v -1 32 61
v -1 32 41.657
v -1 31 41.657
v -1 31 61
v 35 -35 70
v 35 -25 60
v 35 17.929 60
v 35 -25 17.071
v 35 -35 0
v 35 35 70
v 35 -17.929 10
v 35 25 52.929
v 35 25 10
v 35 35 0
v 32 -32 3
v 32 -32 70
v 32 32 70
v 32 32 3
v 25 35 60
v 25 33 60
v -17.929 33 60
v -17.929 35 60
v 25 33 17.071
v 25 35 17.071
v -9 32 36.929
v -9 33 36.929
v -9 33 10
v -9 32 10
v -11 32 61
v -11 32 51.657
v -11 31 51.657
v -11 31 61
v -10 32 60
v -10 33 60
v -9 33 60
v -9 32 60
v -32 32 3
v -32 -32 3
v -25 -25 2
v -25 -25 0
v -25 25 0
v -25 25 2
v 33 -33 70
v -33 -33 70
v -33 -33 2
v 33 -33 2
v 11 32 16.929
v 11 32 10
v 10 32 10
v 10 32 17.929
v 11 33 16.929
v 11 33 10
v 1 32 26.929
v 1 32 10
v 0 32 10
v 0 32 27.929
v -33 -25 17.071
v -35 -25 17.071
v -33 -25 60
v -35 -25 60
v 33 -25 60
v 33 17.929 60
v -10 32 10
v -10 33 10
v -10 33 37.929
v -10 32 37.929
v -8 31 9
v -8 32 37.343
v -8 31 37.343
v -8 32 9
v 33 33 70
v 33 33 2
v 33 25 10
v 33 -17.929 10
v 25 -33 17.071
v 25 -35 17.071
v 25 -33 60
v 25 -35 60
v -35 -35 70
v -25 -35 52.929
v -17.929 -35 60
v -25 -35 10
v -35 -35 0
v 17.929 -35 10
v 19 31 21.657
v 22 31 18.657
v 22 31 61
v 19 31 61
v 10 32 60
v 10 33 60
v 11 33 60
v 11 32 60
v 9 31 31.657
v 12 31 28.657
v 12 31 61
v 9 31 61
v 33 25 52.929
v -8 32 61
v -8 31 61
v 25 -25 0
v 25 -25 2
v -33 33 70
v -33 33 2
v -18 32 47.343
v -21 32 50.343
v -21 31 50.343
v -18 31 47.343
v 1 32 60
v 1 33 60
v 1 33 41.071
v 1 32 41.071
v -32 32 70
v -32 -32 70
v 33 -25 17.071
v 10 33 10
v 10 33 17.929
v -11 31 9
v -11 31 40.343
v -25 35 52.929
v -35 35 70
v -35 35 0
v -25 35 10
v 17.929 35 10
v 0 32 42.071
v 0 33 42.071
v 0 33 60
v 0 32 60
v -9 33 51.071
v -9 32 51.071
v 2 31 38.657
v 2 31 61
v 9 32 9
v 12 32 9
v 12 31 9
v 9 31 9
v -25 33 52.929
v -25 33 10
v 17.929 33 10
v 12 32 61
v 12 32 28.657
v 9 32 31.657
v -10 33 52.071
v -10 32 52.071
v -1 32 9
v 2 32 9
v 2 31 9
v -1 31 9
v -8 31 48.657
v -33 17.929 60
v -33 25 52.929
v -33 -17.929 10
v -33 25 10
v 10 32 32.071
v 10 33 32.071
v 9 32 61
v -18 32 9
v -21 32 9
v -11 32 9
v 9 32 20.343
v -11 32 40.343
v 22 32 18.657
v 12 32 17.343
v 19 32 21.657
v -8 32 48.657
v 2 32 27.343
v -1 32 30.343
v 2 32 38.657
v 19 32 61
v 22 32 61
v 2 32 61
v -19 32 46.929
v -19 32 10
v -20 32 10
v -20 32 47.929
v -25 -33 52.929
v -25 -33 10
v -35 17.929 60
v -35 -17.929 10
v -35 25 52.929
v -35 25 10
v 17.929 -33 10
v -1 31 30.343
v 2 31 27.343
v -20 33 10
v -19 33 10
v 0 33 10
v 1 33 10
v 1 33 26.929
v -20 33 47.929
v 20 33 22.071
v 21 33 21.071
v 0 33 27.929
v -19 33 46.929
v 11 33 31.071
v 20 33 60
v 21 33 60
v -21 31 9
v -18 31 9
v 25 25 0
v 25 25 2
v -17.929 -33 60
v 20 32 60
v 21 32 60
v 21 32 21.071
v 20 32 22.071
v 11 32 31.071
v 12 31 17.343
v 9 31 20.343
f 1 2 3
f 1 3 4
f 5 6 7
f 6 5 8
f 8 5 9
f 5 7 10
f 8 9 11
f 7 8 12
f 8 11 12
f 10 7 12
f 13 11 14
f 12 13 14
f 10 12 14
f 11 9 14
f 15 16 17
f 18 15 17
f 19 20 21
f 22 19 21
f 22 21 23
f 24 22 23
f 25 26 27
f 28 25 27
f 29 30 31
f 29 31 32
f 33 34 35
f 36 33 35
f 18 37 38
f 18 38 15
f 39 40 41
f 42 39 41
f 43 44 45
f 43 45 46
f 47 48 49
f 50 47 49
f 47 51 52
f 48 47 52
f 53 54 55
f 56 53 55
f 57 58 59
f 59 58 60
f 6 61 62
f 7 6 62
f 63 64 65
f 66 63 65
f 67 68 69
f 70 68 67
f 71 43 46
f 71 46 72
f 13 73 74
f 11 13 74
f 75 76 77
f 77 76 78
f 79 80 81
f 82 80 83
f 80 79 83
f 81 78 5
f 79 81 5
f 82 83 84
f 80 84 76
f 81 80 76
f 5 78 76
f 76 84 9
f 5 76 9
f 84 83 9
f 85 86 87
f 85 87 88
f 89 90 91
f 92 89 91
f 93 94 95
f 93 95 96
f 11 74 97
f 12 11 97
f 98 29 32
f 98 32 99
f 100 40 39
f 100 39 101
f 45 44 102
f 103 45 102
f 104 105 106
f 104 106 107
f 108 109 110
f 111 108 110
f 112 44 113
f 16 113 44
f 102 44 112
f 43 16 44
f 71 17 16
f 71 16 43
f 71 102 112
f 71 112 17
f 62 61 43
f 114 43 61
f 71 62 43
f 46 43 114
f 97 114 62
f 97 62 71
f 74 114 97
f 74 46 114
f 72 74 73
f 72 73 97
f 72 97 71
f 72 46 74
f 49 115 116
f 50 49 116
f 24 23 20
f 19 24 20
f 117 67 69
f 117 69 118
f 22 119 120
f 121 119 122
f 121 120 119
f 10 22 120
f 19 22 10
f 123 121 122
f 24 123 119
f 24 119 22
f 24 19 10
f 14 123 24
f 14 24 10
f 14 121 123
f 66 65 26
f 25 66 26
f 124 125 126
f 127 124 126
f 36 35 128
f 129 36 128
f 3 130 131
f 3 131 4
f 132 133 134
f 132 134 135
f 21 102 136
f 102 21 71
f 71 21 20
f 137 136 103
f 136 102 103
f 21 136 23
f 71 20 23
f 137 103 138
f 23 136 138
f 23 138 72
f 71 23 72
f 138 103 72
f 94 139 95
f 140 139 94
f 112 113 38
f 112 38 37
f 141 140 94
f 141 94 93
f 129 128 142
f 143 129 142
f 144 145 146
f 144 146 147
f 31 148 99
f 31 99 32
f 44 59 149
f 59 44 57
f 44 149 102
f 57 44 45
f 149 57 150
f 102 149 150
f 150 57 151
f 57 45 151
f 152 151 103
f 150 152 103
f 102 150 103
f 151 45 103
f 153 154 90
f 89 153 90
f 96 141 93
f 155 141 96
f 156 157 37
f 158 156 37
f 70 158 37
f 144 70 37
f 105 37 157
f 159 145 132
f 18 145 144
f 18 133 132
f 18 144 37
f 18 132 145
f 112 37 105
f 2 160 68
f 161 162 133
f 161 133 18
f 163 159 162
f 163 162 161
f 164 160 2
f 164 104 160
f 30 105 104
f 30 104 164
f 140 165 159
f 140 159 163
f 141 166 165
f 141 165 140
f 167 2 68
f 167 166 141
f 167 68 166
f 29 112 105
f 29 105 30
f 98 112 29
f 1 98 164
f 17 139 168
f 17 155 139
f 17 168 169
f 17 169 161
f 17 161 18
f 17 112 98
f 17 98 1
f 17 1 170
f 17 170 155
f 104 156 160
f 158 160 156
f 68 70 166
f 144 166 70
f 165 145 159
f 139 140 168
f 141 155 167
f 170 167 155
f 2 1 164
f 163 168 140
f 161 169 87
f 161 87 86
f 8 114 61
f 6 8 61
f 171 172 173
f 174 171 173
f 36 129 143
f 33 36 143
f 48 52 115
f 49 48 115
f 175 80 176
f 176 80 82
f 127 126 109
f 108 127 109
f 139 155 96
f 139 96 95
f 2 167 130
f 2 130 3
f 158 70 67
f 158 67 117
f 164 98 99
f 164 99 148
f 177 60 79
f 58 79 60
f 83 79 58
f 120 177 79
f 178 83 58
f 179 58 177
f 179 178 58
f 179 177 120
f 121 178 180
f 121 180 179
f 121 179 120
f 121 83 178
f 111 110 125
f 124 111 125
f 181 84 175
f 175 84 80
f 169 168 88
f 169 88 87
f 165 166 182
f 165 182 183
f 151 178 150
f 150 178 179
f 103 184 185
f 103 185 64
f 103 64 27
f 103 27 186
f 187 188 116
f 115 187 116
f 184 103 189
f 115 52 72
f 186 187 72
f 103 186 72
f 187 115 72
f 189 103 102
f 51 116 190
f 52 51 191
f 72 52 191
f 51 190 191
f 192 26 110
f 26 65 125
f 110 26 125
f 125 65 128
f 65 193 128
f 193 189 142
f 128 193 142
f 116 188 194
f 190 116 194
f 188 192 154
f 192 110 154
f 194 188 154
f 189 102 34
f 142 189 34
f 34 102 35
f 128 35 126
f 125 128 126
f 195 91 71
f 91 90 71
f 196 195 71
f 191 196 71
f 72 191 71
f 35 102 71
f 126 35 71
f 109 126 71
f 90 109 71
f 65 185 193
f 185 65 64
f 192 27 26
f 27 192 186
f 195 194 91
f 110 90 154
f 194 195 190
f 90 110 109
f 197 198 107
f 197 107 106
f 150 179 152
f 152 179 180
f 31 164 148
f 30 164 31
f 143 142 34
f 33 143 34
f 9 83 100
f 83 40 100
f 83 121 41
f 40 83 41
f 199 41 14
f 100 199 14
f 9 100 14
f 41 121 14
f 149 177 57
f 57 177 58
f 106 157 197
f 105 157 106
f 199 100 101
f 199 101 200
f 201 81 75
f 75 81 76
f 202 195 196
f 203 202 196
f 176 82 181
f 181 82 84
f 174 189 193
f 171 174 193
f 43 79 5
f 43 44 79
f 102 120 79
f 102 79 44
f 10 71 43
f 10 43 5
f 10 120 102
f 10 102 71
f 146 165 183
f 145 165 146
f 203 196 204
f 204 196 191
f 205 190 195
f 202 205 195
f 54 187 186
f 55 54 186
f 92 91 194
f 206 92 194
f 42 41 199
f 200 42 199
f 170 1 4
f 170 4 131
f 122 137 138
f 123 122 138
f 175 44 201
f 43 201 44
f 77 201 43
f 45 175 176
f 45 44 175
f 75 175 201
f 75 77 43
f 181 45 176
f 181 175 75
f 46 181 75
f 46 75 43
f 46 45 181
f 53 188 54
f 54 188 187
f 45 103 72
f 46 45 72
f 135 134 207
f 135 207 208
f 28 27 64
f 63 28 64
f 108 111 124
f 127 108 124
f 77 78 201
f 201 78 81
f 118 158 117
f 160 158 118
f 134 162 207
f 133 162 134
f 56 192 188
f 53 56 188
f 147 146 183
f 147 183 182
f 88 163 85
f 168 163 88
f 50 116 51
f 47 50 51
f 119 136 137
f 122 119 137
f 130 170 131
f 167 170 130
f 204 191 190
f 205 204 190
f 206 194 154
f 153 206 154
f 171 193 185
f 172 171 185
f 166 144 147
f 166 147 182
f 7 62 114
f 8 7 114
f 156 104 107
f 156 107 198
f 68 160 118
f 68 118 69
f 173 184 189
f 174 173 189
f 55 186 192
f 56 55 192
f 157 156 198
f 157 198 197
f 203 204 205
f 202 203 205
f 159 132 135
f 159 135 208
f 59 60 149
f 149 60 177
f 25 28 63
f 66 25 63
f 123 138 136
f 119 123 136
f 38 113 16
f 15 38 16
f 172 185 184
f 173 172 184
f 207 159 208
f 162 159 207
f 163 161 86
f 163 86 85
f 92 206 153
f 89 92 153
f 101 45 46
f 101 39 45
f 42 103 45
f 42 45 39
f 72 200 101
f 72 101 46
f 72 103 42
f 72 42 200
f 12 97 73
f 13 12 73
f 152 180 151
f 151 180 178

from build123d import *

# Parameters (mm, degrees)
F0_W      = 66
F0_H      = 66
F0_W_2    = 50
F0_H_2    = 50
F1_DEPTH  = 2
F0_W_3    = 70
F0_H_3    = 70
F2_DEPTH  = 70
F4_DEPTH  = 70.001
F6_DEPTH  = 70.001
F7_W      = 66
F7_H      = 66
F8_DEPTH  = 68
F10_DEPTH = 1
F11_DEPTH = 1
F12_T     = -1


with BuildPart() as f1:
    # F0 (on Top) → F1 (new body)
    with BuildSketch(Plane.XY):
        Rectangle(F0_W, F0_H)
        Rectangle(F0_W_2, F0_H_2, mode=Mode.SUBTRACT)
    extrude(amount=F1_DEPTH)

    # F0 (on Top) → F2 (join)
    with BuildSketch(Plane.XY):
        Rectangle(F0_W_3, F0_H_3)
        Rectangle(F0_W, F0_H, mode=Mode.SUBTRACT)
    extrude(amount=F2_DEPTH)

    # F3 (on face) → F4 (cut, through all)
    with BuildSketch(Plane.XZ.offset(35)):
        Polygon((-17.9289321881, 60), (25, 17.0710678119), (25, 60), align=None)
        Polygon((-25, 10), (17.9289321881, 10), (-25, 52.9289321881), align=None)
    extrude(amount=-F4_DEPTH, mode=Mode.SUBTRACT)

    # F5 (on face) → F6 (cut, through all)
    with BuildSketch(Plane(origin=(-35, 0, 0), x_dir=(0, -1, 0), z_dir=(-1, 0, 0))):
        Polygon((-17.9289321881, 60), (25, 17.0710678119), (25, 60), align=None)
        Polygon((-25, 10), (17.9289321881, 10), (-25, 52.9289321881), align=None)
    extrude(amount=-F6_DEPTH, mode=Mode.SUBTRACT)


with BuildPart() as f8:
    # F7 (on face) → F8 (new body, through all)
    with BuildSketch(Plane.XY.offset(70)):
        Rectangle(F7_W, F7_H)
    extrude(amount=-F8_DEPTH)

    # F9 (on face) → F10 (cut)
    with BuildSketch(Plane(origin=(0, 33, 0), x_dir=(-1, 0, 0), z_dir=(0, 1, 0))):
        Polygon((-11, 60), (-11, 31.0710678119), (-10, 32.0710678119), (-10, 60), align=None)
    extrude(amount=-F10_DEPTH, mode=Mode.SUBTRACT)

    # F9 (on face) → F11 (cut)
    with BuildSketch(Plane(origin=(0, 33, 0), x_dir=(-1, 0, 0), z_dir=(0, 1, 0))):
        Polygon((-21, 60), (-21, 21.0710678119), (-20, 22.0710678119), (-20, 60), align=None)
        Polygon((-1, 60), (-1, 41.0710678119), (0, 42.0710678119), (0, 60), align=None)
        Polygon((9, 60), (9, 51.0710678119), (10, 52.0710678119), (10, 60), align=None)
        Polygon((20, 47.9289321881), (19, 46.9289321881), (19, 10), (20, 10), align=None)
        Polygon((10, 37.9289321881), (9, 36.9289321881), (9, 10), (10, 10), align=None)
        Polygon((0, 27.9289321881), (-1, 26.9289321881), (-1, 10), (0, 10), align=None)
        Polygon((-10, 17.9289321881), (-11, 16.9289321881), (-11, 10), (-10, 10), align=None)
    extrude(amount=-F11_DEPTH, mode=Mode.SUBTRACT)

    # F12
    f12_openings = [f8.faces().sort_by_distance(p)[0] for p in [
        (0, 0, 70),
    ]]
    offset(amount=F12_T, openings=f12_openings, kind=Kind.INTERSECTION)


solid = Compound([f1.part, f8.part])
